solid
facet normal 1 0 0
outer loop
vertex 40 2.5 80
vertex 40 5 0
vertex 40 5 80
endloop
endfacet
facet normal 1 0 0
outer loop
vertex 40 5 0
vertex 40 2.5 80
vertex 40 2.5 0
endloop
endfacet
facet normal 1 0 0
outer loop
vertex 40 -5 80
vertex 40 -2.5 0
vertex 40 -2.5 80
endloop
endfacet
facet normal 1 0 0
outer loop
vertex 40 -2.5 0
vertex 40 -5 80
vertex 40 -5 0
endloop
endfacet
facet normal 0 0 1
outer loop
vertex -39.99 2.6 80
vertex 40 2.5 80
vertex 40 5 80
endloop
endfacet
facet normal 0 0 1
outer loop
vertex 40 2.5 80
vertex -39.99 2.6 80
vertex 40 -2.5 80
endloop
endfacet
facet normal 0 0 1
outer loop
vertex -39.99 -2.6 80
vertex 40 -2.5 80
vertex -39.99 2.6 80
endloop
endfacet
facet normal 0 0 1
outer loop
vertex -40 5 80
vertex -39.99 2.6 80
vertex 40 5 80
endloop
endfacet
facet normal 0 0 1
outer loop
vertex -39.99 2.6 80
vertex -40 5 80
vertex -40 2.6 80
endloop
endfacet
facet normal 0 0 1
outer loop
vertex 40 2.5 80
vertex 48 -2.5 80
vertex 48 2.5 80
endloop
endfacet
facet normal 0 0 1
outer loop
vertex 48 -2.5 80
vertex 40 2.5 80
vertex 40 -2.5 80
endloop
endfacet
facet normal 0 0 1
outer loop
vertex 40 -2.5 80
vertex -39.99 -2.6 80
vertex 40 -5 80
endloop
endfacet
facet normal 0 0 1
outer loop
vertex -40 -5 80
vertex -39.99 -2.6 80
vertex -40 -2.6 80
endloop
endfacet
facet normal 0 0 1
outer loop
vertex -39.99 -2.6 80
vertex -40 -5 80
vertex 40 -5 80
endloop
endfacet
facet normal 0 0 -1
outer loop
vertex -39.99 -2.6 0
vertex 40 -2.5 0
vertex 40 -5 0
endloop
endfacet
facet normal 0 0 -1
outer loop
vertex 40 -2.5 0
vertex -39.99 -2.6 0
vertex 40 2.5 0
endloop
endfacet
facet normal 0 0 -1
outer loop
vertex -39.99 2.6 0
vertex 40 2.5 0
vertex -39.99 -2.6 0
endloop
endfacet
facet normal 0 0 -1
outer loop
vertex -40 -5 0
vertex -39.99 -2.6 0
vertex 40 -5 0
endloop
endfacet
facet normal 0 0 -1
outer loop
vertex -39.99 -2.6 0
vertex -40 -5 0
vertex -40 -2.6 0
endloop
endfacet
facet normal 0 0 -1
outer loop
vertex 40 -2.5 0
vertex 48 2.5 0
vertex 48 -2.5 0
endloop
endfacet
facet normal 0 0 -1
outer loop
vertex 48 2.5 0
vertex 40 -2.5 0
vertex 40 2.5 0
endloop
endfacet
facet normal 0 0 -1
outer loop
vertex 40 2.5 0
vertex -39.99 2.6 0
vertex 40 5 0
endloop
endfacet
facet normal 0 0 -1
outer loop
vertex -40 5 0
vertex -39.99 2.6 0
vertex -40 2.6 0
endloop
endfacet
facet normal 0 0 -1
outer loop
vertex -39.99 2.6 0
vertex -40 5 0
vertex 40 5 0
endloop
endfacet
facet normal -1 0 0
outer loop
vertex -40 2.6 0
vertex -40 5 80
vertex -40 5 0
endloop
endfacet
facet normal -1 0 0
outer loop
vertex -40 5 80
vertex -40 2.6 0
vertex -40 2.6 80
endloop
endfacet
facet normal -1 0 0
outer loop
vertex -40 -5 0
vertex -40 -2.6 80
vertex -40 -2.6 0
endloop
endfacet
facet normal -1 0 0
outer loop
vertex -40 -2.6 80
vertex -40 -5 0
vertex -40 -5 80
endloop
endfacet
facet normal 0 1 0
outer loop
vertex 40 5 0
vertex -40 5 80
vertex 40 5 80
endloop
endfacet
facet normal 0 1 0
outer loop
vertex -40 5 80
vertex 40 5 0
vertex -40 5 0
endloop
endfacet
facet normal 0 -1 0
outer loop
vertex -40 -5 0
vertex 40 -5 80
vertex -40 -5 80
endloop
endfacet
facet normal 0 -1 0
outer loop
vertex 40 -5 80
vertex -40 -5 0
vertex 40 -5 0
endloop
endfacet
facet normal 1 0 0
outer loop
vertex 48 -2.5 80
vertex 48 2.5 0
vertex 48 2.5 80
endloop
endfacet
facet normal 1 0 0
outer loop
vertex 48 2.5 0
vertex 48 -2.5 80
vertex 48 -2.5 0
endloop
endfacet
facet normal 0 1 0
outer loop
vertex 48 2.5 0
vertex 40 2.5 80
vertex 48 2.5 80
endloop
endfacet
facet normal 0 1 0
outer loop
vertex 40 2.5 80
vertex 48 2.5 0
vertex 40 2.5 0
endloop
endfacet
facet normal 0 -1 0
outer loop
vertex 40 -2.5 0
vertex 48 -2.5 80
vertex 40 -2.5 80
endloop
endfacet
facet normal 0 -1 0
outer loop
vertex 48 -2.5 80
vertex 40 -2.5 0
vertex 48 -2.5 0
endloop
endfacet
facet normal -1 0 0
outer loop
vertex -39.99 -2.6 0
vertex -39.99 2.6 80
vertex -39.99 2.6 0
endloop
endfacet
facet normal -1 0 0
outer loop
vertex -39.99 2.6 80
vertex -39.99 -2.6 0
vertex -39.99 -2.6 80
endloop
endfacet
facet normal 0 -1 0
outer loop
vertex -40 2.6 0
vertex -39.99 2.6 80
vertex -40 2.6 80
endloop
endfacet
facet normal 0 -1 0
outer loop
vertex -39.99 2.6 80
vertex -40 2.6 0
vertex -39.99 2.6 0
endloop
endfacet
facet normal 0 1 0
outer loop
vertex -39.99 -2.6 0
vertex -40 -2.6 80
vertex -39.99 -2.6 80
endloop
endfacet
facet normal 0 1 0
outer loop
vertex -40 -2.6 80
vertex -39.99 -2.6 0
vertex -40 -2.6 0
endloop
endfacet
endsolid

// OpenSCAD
// file: common.scad
// Shared dimensions + joint primitives for the SaySpark maze kit.
// Edit values here once and every piece updates uniformly.
//
// Convention used by all pieces in this folder:
//   • Tab on the +X end (sticks out, plugs into the next piece's socket)
//   • Socket on the -X end (pocket cut in, accepts the previous piece's tab)
// Pieces chain end-to-end. Rotate corners 0/90/180/270° to aim turns.

/* [Wall geometry — mm] */
cell_size      = 80;   // [40:5:200]    wall body length (along chain axis)
wall_height    = 80;   // [20:1:120]    how tall the wall stands
wall_thickness = 10;   // [5:0.5:20]    how thick / "wide" the wall is

/* [Joint geometry — mm] */
tab_length     = 8;    // [4:1:15]      how far the tab sticks out / socket goes in
tab_thickness  = 5;    // [2:0.5:9]     tab cross-section (must be < wall_thickness)
slot_clearance = 0.2;  // [0.1:0.05:0.4]  printer tolerance gap

/* [Corner geometry — mm] */
arm_length     = 30;   // [15:1:60]     length of each corner arm

$fn = 48;

// ─── Joint primitives ────────────────────────────────────────────────────
// Tab — sticks out in +X from origin. Origin = base of tab where it joins
// the body. Full wall_height tall so the joint is as strong as the wall.
module joint_tab() {
  translate([0, -tab_thickness / 2, 0])
    cube([tab_length, tab_thickness, wall_height]);
}

// Socket — pocket carved from origin going in -X (into the body).
// Caller subtracts this from a body shape to cut the pocket.
// Sized slightly larger than the tab by `slot_clearance` so parts slide.
module joint_socket() {
  translate([-tab_length - 0.01,
             -(tab_thickness + slot_clearance) / 2,
             -0.01])
    cube([tab_length + 0.02,
          tab_thickness + slot_clearance,
          wall_height + 0.02]);
}
// main file
// Wall — a flat panel with a tab on one end and a socket on the other.
// Two walls chain end-to-end (tab of A plugs into socket of B). Multiple
// walls form a straight run; insert a corner piece to turn 90°.
//
// Open this file in OpenSCAD, hit F5 to preview, F6 to render solid,
// then File > Export > Export as STL to print.

include <common.scad>;

module wall() {
  difference() {
    union() {
      // Body — centered along X
      translate([-cell_size / 2, -wall_thickness / 2, 0])
        cube([cell_size, wall_thickness, wall_height]);
      // Tab on the +X end
      translate([cell_size / 2, 0, 0])
        joint_tab();
    }
    // Socket on the -X end
    translate([-cell_size / 2, 0, 0])
      joint_socket();
  }
}

// Render the piece when this file is opened directly.
wall();
